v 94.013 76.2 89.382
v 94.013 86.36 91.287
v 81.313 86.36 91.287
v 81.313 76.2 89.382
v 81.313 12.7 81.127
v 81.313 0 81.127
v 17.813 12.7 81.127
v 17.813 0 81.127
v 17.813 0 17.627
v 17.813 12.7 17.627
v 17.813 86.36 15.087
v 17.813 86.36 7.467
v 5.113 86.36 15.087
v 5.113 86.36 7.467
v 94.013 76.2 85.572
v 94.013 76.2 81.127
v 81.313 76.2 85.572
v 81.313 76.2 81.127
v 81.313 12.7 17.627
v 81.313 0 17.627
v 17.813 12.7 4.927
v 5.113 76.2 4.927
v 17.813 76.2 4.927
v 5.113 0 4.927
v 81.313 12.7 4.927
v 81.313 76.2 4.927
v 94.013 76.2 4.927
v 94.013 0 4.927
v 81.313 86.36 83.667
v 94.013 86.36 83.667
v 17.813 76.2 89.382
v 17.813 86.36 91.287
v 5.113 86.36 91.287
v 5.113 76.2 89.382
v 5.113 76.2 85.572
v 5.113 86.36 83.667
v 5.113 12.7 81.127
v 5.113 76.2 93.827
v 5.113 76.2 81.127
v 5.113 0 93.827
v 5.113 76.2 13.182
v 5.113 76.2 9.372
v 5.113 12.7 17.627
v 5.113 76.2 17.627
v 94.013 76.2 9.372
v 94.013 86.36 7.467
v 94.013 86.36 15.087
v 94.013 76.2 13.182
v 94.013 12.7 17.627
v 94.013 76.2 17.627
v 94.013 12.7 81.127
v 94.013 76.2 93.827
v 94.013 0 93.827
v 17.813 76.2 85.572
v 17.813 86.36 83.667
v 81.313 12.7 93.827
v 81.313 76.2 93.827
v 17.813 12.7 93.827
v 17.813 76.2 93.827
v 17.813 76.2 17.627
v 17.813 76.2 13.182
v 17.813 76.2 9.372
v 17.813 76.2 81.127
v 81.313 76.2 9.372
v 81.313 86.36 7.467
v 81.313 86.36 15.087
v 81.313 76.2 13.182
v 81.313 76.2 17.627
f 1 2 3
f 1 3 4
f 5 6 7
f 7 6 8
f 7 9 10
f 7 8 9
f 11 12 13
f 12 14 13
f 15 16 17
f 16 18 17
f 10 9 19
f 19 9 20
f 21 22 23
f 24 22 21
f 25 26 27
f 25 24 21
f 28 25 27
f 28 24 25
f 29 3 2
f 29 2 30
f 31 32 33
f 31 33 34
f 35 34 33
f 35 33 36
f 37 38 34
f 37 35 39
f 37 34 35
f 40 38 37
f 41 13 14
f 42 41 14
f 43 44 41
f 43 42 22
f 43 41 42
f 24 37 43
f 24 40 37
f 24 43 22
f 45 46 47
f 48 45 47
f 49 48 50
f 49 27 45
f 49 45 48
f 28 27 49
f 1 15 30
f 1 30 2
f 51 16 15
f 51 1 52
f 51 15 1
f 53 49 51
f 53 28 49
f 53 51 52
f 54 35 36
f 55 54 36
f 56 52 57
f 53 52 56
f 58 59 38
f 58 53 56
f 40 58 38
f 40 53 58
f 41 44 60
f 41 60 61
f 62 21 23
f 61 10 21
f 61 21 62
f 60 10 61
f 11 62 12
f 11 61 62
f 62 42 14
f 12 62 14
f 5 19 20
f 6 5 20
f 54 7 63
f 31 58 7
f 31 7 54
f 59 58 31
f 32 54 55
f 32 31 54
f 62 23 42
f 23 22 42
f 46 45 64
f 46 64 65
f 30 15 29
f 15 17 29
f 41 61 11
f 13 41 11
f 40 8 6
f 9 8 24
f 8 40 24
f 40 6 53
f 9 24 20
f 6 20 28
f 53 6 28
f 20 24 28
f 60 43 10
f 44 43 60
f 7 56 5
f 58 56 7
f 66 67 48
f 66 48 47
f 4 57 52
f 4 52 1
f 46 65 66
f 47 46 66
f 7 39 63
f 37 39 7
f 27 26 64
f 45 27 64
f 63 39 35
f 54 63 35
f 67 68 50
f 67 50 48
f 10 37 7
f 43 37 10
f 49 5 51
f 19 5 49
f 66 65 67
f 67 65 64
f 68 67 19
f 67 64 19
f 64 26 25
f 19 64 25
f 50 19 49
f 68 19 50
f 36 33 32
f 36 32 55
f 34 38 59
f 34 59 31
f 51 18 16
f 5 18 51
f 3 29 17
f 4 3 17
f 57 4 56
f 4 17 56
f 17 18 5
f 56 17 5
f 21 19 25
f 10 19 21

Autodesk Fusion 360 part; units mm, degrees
sketch "Sketch1" plane through (0, 0, 0) normal (0, 1, 0) x (1, 0, 0)
  line L0 (5.1128, -4.9272) -> (94.0128, -4.9272)
  line L1 (94.0128, -4.9272) -> (94.0128, -93.8272)
  line L2 (94.0128, -93.8272) -> (5.1128, -93.8272)
  line L3 (5.1128, -93.8272) -> (5.1128, -4.9272)
  line L4 (17.8128, -17.6272) -> (81.3128, -17.6272)
  line L5 (81.3128, -17.6272) -> (81.3128, -81.1272)
  line L6 (81.3128, -81.1272) -> (17.8128, -81.1272)
  line L7 (17.8128, -81.1272) -> (17.8128, -17.6272)
  dimension "d1" = 88.9
  dimension "d2" = 88.9
  dimension "d3" = 12.7
  dimension "d4" = 12.7
  dimension "d5" = 12.7
  dimension "d6" = 12.7
extrude "Extrude1" add sketch "Sketch1" along normal blind 88.9
sketch "Sketch2" plane through (0, 0, 93.8272) normal (0, 0, 1) x (1, 0, 0)
  line L0 (5.1128, 0) -> (94.0128, 0)
  line L1 (94.0128, 0) -> (94.0128, 88.9)
  line L2 (94.0128, 88.9) -> (5.1128, 88.9)
  line L3 (5.1128, 88.9) -> (5.1128, 0)
  line L4 (17.8128, 76.2) -> (81.3128, 76.2)
  line L5 (81.3128, 76.2) -> (81.3128, 12.7)
  line L6 (81.3128, 12.7) -> (17.8128, 12.7)
  line L7 (17.8128, 12.7) -> (17.8128, 76.2)
  dimension "d9" = 12.7
  dimension "d10" = 12.7
  dimension "d11" = 12.7
  dimension "d12" = 12.7
extrude "Extrude2" cut sketch "Sketch2" against normal blind 88.9 contours L4 L5 L6 L7
sketch "Sketch3" plane through (5.1128, 0, 0) normal (-1, 0, 0) x (0, 0, 1)
  line L0 (4.9272, 0) -> (93.8272, 0)
  line L1 (93.8272, 0) -> (93.8272, 88.9)
  line L2 (93.8272, 88.9) -> (4.9272, 88.9)
  line L3 (4.9272, 88.9) -> (4.9272, 0)
  line L4 (17.6272, 76.2) -> (81.1272, 76.2)
  line L5 (81.1272, 76.2) -> (81.1272, 12.7)
  line L6 (81.1272, 12.7) -> (17.6272, 12.7)
  line L7 (17.6272, 12.7) -> (17.6272, 76.2)
  dimension "d15" = 12.7
  dimension "d16" = 12.7
  dimension "d17" = 12.7
  dimension "d18" = 12.7
extrude "Extrude3" cut sketch "Sketch3" against normal blind 88.9 contours L4 L5 L6 L7
sketch "Sketch4" plane through (5.1128, 0, 0) normal (-1, 0, 0) x (0, 0, 1)
  line L0 (81.1272, 76.2) -> (81.1272, 12.7)
  line L1 (81.1272, 12.7) -> (17.6272, 12.7)
  line L2 (17.6272, 12.7) -> (17.6272, 76.2)
  line L3 (17.6272, 76.2) -> (81.1272, 76.2)
  line L4 (4.9272, 0) -> (93.8272, 0)
  line L5 (93.8272, 0) -> (93.8272, 88.9)
  line L6 (93.8272, 88.9) -> (4.9272, 88.9)
  line L7 (4.9272, 88.9) -> (4.9272, 0)
  line L8 (17.6272, 76.2) -> (81.1272, 76.2)
  line L9 (81.1272, 88.9) -> (17.6272, 88.9)
  line L10 (17.6272, 76.2) -> (4.9272, 76.2) construction
  line L11 (11.2772, 76.2) -> (11.2772, 88.9) construction
  line L12 (17.6272, 76.2) -> (13.1822, 76.2)
  line L13 (4.9272, 76.2) -> (9.3722, 76.2)
  line L14 (17.6272, 88.9) -> (15.0872, 88.9) construction
  line L15 (4.9272, 88.9) -> (7.4672, 88.9)
  line L16 (7.4672, 88.9) -> (7.4672, 86.36) construction
  line L17 (15.0872, 88.9) -> (15.0872, 86.36) construction
  line L18 (9.3722, 76.2) -> (7.4672, 86.36)
  line L19 (7.4672, 86.36) -> (15.0872, 86.36)
  line L20 (13.1822, 76.2) -> (15.0872, 86.36)
  line L21 (81.1272, 76.2) -> (93.8272, 76.2) construction
  line L22 (87.4772, 76.2) -> (87.4772, 88.9) construction
  line L23 (81.1272, 76.2) -> (85.5722, 76.2)
  line L24 (93.8272, 76.2) -> (89.3822, 76.2)
  line L25 (81.1272, 88.9) -> (83.6672, 88.9) construction
  line L26 (93.8272, 88.9) -> (91.2872, 88.9) construction
  line L27 (91.2872, 88.9) -> (91.2872, 86.36) construction
  line L28 (83.6672, 88.9) -> (83.6672, 86.36) construction
  line L29 (85.5722, 76.2) -> (83.6672, 86.36)
  line L30 (91.2872, 86.36) -> (89.3822, 76.2)
  line L31 (91.2872, 86.36) -> (83.6672, 86.36)
  dimension "d21" = 4.445
  dimension "d22" = 4.445
  dimension "d23" = 2.54
  dimension "d24" = 2.54
  dimension "d25" = 2.54
  dimension "d26" = 2.54
  dimension "d27" = 4.445
  dimension "d28" = 4.445
  dimension "d30" = 2.54
  dimension "d31" = 2.54
  dimension "d32" = 2.54
sketch "Sketch5" plane through (0, 0, 4.9272) normal (0, 0, -1) x (-1, 0, 0)
  line L0 (-81.3128, 12.7) -> (-81.3128, 76.2)
  line L1 (-81.3128, 76.2) -> (-17.8128, 76.2)
  line L2 (-17.8128, 76.2) -> (-17.8128, 12.7)
  line L3 (-17.8128, 12.7) -> (-81.3128, 12.7)
  line L4 (-94.0128, 0) -> (-5.1128, 0)
  line L5 (-5.1128, 0) -> (-5.1128, 88.9)
  line L6 (-5.1128, 88.9) -> (-94.0128, 88.9)
  line L7 (-94.0128, 88.9) -> (-94.0128, 0)
  line L8 (-81.3128, 76.2) -> (-17.8128, 76.2)
  line L9 (-17.8128, 76.2) -> (-17.8128, 88.9)
  line L10 (-17.8128, 88.9) -> (-81.3128, 88.9)
  line L11 (-81.3128, 88.9) -> (-81.3128, 76.2)
extrude "Extrude4" cut sketch "Sketch5" against normal blind 88.9 contours L1 L6 L8 L9 L10 L11
extrude "Extrude5" cut sketch "Sketch4" against normal blind 88.9 contours L3 L5 L6 L7 L8 L9 L12 L13 L15 L18 L19 L20 L23 L24 L29 L30 L31
